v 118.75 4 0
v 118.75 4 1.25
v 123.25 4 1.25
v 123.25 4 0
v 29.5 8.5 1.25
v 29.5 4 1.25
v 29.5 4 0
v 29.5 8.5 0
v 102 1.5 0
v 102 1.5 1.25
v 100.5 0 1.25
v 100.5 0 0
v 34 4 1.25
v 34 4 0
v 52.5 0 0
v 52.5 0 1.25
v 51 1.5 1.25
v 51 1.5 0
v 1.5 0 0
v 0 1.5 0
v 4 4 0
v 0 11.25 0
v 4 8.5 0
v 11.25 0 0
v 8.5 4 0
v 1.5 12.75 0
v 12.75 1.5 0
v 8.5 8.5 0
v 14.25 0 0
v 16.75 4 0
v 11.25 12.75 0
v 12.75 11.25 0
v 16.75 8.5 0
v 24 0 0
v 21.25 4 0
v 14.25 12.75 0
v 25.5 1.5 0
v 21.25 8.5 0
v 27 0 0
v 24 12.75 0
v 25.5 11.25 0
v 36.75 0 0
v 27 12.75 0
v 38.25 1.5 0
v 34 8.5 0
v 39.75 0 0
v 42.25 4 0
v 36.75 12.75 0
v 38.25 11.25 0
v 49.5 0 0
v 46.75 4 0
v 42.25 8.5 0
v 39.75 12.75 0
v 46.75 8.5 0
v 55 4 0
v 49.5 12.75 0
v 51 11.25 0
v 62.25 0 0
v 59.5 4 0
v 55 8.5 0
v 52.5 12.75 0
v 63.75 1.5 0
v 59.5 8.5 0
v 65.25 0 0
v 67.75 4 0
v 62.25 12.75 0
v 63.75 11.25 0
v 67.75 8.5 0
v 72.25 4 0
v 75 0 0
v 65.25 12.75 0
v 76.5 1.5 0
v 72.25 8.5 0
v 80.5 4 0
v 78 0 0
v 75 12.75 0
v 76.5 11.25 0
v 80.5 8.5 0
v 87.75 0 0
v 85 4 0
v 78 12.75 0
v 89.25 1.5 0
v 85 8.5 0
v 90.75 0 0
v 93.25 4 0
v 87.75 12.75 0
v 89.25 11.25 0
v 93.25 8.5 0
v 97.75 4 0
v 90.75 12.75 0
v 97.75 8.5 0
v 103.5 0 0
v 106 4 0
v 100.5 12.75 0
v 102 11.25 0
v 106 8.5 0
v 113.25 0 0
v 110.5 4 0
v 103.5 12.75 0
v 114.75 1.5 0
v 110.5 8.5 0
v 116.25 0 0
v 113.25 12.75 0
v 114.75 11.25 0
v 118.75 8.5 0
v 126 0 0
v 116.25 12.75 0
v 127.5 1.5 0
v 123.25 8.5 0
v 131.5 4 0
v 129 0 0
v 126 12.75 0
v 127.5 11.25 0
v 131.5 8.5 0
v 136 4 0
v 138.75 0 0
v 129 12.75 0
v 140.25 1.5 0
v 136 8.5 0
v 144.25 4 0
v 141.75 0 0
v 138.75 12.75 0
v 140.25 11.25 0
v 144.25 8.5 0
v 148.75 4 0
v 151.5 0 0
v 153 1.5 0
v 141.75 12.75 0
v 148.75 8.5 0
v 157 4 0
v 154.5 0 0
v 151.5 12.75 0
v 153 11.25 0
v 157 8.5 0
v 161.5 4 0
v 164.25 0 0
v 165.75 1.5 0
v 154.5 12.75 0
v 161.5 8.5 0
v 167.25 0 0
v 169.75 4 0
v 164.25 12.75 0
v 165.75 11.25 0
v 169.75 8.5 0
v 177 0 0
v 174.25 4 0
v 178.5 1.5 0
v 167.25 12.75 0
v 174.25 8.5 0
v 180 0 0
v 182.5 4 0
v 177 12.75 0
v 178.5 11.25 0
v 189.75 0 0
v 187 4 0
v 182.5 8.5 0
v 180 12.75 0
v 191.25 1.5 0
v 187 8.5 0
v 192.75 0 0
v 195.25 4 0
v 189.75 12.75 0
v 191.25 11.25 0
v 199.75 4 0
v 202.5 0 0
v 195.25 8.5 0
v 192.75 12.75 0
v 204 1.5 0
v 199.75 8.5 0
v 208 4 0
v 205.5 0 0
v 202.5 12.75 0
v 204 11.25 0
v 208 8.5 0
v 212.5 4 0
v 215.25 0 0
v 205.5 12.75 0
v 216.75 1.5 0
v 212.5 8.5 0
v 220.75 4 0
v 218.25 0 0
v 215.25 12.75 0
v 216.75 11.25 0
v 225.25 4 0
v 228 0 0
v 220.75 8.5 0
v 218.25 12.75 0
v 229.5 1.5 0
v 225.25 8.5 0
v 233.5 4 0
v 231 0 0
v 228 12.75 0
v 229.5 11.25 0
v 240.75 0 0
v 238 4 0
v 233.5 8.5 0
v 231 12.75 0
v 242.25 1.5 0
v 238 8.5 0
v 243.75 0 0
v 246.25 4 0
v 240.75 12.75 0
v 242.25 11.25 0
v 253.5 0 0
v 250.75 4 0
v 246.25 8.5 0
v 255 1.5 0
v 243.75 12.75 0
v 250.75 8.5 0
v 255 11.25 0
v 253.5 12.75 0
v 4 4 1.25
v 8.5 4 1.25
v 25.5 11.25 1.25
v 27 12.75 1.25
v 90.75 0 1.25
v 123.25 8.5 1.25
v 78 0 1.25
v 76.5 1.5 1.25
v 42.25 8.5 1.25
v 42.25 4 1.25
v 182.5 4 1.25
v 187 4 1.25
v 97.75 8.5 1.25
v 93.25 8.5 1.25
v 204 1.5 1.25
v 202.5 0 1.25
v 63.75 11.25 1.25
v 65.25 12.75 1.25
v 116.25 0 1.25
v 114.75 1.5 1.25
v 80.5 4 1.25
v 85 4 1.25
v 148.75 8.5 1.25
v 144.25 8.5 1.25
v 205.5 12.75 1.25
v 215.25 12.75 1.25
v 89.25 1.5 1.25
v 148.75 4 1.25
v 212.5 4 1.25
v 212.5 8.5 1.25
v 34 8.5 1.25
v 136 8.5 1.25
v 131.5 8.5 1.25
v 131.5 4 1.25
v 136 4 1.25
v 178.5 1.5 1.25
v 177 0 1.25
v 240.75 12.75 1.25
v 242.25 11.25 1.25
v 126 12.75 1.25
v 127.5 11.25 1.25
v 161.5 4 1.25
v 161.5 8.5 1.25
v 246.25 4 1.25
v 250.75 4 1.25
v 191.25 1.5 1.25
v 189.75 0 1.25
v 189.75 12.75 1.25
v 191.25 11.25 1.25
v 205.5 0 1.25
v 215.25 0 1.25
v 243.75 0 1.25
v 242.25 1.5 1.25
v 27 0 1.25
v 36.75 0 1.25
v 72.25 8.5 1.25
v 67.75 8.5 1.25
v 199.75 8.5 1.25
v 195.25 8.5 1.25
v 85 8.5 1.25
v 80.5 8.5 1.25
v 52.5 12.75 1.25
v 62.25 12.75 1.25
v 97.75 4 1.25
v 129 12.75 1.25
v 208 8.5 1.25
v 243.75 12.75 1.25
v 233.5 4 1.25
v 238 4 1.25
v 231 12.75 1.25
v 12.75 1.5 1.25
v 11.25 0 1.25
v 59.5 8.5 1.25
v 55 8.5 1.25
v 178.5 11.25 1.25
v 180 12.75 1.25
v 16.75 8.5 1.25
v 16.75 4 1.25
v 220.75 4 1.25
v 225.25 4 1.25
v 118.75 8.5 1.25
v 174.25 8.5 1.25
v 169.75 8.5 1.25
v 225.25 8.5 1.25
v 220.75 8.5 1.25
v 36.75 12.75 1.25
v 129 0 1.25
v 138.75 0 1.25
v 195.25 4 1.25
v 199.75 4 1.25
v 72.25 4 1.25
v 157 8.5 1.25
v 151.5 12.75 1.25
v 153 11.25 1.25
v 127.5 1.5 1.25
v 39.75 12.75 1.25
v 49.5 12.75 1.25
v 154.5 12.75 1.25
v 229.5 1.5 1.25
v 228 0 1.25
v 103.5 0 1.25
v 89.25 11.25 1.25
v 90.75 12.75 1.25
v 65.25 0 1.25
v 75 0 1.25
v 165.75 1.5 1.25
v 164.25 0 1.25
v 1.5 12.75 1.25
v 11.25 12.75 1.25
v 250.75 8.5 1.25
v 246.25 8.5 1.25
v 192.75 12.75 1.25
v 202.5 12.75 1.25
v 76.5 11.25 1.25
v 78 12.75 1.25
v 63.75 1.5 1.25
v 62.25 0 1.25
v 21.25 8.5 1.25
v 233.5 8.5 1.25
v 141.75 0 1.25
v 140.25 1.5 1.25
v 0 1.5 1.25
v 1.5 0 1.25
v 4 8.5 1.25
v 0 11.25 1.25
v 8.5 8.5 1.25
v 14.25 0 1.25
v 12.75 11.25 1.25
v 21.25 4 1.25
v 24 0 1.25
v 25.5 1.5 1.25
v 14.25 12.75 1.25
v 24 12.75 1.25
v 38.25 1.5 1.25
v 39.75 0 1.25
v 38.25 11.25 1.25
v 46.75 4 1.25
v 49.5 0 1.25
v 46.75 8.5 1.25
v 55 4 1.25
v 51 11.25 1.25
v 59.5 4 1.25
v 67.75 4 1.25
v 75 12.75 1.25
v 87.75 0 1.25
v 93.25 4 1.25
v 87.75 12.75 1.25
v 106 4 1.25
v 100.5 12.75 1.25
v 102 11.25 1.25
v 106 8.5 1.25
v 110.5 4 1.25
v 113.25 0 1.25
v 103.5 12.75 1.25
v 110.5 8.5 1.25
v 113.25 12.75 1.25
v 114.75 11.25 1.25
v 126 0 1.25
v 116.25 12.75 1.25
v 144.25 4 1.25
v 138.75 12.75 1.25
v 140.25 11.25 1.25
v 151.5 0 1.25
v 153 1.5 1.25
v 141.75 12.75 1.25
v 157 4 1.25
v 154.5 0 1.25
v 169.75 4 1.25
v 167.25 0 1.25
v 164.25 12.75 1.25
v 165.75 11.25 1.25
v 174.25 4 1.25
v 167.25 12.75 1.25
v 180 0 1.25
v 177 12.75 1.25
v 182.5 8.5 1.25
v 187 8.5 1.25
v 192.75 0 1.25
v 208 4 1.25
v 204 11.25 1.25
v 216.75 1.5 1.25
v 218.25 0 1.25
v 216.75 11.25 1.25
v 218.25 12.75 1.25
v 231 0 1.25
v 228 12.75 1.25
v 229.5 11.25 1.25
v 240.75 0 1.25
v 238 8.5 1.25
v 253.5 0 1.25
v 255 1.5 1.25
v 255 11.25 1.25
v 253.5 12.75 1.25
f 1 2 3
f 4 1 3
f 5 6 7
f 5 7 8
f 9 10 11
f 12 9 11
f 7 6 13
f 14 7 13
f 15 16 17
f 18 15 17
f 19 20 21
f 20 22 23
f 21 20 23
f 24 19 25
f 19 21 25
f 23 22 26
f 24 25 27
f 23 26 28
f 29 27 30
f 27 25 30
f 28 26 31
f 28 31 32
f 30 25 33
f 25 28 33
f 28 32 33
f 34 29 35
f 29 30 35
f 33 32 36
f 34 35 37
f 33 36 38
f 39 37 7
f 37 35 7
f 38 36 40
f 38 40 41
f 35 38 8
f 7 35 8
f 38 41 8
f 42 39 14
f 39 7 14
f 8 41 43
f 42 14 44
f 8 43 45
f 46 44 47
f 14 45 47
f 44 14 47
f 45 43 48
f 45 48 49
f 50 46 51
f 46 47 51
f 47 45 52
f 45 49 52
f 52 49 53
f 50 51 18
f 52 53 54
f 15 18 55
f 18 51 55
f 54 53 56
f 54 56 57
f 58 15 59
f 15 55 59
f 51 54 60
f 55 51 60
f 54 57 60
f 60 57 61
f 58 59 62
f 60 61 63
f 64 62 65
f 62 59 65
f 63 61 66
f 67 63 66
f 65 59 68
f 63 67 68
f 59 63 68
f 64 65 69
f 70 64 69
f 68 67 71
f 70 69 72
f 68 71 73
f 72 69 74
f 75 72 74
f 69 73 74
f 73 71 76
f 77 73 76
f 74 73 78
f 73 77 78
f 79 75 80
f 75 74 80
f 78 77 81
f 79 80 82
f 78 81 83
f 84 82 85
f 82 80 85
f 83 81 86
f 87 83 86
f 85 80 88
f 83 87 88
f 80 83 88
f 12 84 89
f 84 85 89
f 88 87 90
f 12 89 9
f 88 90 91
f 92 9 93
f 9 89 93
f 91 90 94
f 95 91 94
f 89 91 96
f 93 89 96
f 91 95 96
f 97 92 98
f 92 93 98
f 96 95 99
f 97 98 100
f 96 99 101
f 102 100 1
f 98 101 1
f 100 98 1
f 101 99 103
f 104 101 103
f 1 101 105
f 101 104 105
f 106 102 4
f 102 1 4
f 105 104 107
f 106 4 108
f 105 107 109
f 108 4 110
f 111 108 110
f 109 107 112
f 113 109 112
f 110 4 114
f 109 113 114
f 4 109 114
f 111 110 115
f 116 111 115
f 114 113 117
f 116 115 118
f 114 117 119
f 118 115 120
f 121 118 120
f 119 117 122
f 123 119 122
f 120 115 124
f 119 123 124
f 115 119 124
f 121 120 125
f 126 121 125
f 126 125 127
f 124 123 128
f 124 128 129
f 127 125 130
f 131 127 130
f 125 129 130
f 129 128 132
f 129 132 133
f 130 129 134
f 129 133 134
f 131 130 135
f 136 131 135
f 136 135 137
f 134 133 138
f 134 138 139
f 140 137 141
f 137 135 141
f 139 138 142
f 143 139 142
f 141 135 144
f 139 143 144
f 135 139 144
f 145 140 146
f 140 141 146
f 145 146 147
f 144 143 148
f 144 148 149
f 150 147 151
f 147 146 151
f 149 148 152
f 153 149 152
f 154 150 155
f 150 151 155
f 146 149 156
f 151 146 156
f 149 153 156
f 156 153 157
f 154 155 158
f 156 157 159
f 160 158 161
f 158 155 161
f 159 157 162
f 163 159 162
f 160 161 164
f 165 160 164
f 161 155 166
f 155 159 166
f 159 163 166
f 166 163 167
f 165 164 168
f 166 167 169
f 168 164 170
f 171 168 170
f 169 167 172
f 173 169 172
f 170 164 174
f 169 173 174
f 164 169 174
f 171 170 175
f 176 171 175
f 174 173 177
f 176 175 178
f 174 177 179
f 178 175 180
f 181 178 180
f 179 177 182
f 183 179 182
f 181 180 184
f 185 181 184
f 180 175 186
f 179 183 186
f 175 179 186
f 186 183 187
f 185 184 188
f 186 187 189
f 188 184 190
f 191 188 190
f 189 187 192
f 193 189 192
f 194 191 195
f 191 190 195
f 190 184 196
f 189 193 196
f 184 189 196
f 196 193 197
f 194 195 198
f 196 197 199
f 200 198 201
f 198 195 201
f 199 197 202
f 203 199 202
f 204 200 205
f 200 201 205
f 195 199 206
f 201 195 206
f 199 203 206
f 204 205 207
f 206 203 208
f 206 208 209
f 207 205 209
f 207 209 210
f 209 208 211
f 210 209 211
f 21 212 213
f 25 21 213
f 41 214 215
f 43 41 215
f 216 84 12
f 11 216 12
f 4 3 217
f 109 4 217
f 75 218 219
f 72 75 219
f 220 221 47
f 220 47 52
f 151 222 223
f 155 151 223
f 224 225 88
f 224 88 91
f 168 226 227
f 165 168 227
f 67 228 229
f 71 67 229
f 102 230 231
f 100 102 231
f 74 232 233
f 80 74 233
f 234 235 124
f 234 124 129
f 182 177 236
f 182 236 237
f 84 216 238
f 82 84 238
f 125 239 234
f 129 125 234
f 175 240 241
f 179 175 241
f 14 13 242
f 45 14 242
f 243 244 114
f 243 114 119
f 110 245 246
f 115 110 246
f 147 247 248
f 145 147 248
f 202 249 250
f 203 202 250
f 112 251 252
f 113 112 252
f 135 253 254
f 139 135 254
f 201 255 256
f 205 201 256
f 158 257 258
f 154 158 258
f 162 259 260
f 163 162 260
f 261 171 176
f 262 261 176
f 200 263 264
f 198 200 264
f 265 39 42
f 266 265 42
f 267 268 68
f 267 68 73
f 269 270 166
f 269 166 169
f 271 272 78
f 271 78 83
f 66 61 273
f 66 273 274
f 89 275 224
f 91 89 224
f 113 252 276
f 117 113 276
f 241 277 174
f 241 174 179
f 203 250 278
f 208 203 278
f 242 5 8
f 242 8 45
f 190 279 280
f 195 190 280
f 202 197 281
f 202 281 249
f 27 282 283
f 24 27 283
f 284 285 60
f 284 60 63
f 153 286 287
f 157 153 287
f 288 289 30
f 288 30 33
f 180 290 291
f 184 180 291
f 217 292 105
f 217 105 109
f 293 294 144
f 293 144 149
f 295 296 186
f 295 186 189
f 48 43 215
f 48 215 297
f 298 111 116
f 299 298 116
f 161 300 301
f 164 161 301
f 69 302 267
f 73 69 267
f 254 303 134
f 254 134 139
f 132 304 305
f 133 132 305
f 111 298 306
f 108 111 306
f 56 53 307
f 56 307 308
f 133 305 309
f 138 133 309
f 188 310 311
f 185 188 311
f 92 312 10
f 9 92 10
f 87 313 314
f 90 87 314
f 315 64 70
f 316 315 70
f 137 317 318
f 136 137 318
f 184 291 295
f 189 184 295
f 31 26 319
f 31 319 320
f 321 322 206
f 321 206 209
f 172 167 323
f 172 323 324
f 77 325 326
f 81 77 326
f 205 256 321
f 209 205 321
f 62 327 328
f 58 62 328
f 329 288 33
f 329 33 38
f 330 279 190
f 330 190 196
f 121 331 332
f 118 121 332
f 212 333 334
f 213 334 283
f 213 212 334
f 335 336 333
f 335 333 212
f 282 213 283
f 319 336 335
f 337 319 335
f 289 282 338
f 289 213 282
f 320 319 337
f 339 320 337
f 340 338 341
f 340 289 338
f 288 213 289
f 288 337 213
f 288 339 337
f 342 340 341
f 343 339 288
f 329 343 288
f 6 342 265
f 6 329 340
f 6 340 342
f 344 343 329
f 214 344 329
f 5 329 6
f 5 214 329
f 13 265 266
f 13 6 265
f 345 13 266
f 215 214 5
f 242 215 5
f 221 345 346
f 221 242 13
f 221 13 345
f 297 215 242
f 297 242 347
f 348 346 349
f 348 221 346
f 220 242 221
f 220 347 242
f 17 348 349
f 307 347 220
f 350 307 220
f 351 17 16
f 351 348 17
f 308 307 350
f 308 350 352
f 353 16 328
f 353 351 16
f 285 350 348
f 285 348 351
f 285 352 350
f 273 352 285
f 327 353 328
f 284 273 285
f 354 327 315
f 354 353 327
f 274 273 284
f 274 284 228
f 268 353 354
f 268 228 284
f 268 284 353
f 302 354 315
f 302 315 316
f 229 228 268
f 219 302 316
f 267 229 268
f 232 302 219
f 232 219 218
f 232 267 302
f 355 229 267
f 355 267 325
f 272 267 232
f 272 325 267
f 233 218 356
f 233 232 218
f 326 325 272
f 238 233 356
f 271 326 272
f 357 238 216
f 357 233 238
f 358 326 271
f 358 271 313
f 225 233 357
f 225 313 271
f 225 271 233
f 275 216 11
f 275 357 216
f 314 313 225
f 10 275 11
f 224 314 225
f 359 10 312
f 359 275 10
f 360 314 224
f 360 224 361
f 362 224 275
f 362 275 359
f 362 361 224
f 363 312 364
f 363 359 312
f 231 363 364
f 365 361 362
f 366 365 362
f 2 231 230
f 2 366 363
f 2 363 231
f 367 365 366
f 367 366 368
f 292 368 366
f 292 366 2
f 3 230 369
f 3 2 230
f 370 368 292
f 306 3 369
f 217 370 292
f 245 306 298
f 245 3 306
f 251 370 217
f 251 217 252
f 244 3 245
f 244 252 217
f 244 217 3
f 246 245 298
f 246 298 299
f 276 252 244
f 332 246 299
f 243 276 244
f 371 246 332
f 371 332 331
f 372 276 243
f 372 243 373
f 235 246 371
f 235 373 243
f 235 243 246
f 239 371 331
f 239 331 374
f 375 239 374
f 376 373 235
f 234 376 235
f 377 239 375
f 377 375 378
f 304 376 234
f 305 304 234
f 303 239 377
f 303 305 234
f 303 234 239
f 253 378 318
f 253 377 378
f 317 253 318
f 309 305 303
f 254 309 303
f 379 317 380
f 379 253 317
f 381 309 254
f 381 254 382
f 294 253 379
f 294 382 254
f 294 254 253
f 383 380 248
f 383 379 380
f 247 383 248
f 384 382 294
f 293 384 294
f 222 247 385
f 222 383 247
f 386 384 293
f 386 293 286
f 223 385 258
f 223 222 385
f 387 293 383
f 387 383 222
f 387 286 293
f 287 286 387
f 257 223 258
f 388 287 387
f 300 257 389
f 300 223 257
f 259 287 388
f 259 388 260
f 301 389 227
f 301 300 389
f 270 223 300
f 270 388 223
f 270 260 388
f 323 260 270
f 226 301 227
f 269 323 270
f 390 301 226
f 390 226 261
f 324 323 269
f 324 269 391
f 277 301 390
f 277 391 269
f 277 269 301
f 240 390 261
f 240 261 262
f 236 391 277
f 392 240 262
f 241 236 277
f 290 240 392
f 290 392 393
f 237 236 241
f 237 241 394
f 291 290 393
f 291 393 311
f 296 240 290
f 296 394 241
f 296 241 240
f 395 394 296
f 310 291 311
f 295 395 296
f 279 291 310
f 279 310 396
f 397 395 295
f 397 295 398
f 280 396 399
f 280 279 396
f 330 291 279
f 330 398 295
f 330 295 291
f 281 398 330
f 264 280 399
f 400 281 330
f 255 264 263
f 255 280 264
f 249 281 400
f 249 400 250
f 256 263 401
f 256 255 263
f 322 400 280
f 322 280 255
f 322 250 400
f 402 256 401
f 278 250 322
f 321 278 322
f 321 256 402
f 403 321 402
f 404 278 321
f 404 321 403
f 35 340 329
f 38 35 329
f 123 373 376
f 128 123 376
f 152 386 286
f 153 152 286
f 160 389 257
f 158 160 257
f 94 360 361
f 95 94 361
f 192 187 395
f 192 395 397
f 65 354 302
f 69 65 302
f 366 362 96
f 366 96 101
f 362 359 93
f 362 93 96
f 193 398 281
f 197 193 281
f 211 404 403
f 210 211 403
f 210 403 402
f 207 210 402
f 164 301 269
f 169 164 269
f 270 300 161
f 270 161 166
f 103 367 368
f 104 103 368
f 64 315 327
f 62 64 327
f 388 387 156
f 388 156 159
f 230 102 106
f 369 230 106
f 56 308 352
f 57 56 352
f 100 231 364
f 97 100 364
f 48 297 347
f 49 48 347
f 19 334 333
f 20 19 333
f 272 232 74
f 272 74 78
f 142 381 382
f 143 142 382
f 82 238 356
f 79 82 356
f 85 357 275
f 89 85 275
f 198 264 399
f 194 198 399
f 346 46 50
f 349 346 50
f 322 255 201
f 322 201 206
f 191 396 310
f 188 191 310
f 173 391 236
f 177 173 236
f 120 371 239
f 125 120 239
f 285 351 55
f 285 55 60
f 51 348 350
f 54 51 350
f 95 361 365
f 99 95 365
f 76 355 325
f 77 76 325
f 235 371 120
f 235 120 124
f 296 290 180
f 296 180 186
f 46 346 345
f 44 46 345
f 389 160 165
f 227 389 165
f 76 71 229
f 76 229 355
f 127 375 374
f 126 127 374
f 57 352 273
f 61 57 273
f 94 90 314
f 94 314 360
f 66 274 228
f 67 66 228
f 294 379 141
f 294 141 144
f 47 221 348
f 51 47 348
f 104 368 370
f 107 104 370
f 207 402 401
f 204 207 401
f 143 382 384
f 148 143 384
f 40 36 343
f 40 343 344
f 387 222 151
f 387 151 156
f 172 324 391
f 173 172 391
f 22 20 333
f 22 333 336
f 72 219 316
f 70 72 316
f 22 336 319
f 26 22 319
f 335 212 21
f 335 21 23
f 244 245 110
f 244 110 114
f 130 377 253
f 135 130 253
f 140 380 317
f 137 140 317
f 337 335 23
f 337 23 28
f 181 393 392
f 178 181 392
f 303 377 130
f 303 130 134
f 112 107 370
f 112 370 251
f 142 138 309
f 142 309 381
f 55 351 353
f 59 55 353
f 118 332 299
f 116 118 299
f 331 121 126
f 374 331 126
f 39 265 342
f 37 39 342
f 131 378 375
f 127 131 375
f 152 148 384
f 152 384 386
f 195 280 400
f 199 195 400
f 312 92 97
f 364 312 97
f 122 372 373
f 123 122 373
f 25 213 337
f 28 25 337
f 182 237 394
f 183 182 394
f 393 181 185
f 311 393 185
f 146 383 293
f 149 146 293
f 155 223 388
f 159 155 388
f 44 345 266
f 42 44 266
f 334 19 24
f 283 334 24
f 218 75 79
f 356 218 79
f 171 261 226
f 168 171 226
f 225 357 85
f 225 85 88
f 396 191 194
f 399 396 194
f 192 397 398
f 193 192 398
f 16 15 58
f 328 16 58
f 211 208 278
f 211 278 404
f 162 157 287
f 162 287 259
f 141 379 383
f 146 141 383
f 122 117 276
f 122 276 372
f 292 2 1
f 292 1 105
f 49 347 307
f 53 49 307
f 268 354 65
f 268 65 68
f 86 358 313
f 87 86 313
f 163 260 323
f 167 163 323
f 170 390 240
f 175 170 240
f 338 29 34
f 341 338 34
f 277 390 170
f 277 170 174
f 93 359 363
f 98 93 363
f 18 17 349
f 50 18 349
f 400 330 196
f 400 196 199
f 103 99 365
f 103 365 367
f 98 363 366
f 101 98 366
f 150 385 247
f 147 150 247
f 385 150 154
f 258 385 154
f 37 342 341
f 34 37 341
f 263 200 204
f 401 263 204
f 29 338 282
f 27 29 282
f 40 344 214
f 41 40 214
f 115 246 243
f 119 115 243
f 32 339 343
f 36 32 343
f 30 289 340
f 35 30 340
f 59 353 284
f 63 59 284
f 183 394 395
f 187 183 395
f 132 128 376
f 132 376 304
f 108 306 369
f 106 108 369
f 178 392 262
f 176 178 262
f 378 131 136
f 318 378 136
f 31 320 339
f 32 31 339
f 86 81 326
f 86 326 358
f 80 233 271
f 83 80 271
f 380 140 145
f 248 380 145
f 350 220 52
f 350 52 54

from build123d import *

# Parameters (mm, degrees)
SKETCH1_W           = 319
SKETCH1_H           = 12.75
BOSS_EXTRUDE1_DEPTH = 1.25
SKETCH2_W           = 4.5
SKETCH2_H           = 4.5
CUT_EXTRUDE1_DEPTH  = 18.25
SKETCH3_W           = 4.5
SKETCH3_H           = 4.5
CUT_EXTRUDE2_DEPTH  = 18.25
CUT_EXTRUDE3_DEPTH  = 18.25


with BuildPart() as part:
    # Sketch1 → Boss-Extrude1 (new body)
    with BuildSketch(Plane.XY):
        with Locations((159.5, 6.375)):
            Rectangle(SKETCH1_W, SKETCH1_H)
    extrude(amount=BOSS_EXTRUDE1_DEPTH)

    # Sketch2 → Cut-Extrude1 (cut)
    with BuildSketch(Plane.XY.offset(1.25)):
        with Locations((6.25, 6.25)):
            Rectangle(SKETCH2_W, SKETCH2_H)
        with Locations((19, 6.25)):
            Rectangle(SKETCH2_W, SKETCH2_H)
        with Locations((31.75, 6.25)):
            Rectangle(SKETCH2_W, SKETCH2_H)
        with Locations((44.5, 6.25)):
            Rectangle(SKETCH2_W, SKETCH2_H)
        with Locations((57.25, 6.25)):
            Rectangle(SKETCH2_W, SKETCH2_H)
        with Locations((70, 6.25)):
            Rectangle(SKETCH2_W, SKETCH2_H)
        with Locations((82.75, 6.25)):
            Rectangle(SKETCH2_W, SKETCH2_H)
        with Locations((95.5, 6.25)):
            Rectangle(SKETCH2_W, SKETCH2_H)
        with Locations((108.25, 6.25)):
            Rectangle(SKETCH2_W, SKETCH2_H)
        with Locations((133.75, 6.25)):
            Rectangle(SKETCH2_W, SKETCH2_H)
        with Locations((146.5, 6.25)):
            Rectangle(SKETCH2_W, SKETCH2_H)
        with Locations((172, 6.25)):
            Rectangle(SKETCH2_W, SKETCH2_H)
        with Locations((184.75, 6.25)):
            Rectangle(SKETCH2_W, SKETCH2_H)
        with Locations((210.25, 6.25)):
            Rectangle(SKETCH2_W, SKETCH2_H)
        with Locations((223, 6.25)):
            Rectangle(SKETCH2_W, SKETCH2_H)
        with Locations((235.75, 6.25)):
            Rectangle(SKETCH2_W, SKETCH2_H)
        with Locations((248.5, 6.25)):
            Rectangle(SKETCH2_W, SKETCH2_H)
        with Locations((261.25, 6.25)):
            Rectangle(SKETCH2_W, SKETCH2_H)
        with Locations((274, 6.25)):
            Rectangle(SKETCH2_W, SKETCH2_H)
        with Locations((286.75, 6.25)):
            Rectangle(SKETCH2_W, SKETCH2_H)
        with Locations((299.5, 6.25)):
            Rectangle(SKETCH2_W, SKETCH2_H)
        with Locations((312.25, 6.25)):
            Rectangle(SKETCH2_W, SKETCH2_H)
        Polygon((0, 12.75), (0, 11.25), (1.5, 12.75), align=None)
        Polygon((1.5, 0), (0, 1.5), (0, 0), align=None)
        Polygon((14.25, 12.75), (11.25, 12.75), (12.75, 11.25), align=None)
        Polygon((12.75, 1.5), (11.25, 0), (14.25, 0), align=None)
        Polygon((25.5, 1.5), (24, 0), (27, 0), align=None)
        Polygon((27, 12.75), (24, 12.75), (25.5, 11.25), align=None)
        Polygon((38.25, 1.5), (36.75, 0), (39.75, 0), align=None)
        Polygon((52.5, 12.75), (49.5, 12.75), (51, 11.25), align=None)
        Polygon((51, 1.5), (49.5, 0), (52.5, 0), align=None)
        Polygon((39.75, 12.75), (36.75, 12.75), (38.25, 11.25), align=None)
        Polygon((65.25, 12.75), (62.25, 12.75), (63.75, 11.25), align=None)
        Polygon((63.75, 1.5), (62.25, 0), (65.25, 0), align=None)
        Polygon((76.5, 1.5), (75, 0), (78, 0), align=None)
        Polygon((78, 12.75), (75, 12.75), (76.5, 11.25), align=None)
        Polygon((90.75, 12.75), (87.75, 12.75), (89.25, 11.25), align=None)
        Polygon((89.25, 1.5), (87.75, 0), (90.75, 0), align=None)
        Polygon((102, 1.5), (100.5, 0), (103.5, 0), align=None)
        Polygon((103.5, 12.75), (100.5, 12.75), (102, 11.25), align=None)
        Polygon((116.25, 12.75), (113.25, 12.75), (114.75, 11.25), align=None)
        Polygon((114.75, 1.5), (113.25, 0), (116.25, 0), align=None)
        Polygon((127.5, 1.5), (126, 0), (129, 0), align=None)
        Polygon((129, 12.75), (126, 12.75), (127.5, 11.25), align=None)
        Polygon((140.25, 1.5), (138.75, 0), (141.75, 0), align=None)
        Polygon((141.75, 12.75), (138.75, 12.75), (140.25, 11.25), align=None)
        Polygon((154.5, 12.75), (151.5, 12.75), (153, 11.25), align=None)
        Polygon((153, 1.5), (151.5, 0), (154.5, 0), align=None)
        Polygon((167.25, 12.75), (164.25, 12.75), (165.75, 11.25), align=None)
        Polygon((180, 12.75), (177, 12.75), (178.5, 11.25), align=None)
        Polygon((192.75, 12.75), (189.75, 12.75), (191.25, 11.25), align=None)
        Polygon((205.5, 12.75), (202.5, 12.75), (204, 11.25), align=None)
        Polygon((218.25, 12.75), (215.25, 12.75), (216.75, 11.25), align=None)
        Polygon((231, 12.75), (228, 12.75), (229.5, 11.25), align=None)
        Polygon((243.75, 12.75), (240.75, 12.75), (242.25, 11.25), align=None)
        Polygon((256.5, 12.75), (253.5, 12.75), (255, 11.25), align=None)
        Polygon((269.25, 12.75), (266.25, 12.75), (267.75, 11.25), align=None)
        Polygon((282, 12.75), (279, 12.75), (280.5, 11.25), align=None)
        Polygon((294.75, 12.75), (291.75, 12.75), (293.25, 11.25), align=None)
        Polygon((307.5, 12.75), (304.5, 12.75), (306, 11.25), align=None)
        Polygon((318.75, 1.5), (317.25, 0), (319, 0), (319, 12.75), (317.25, 12.75), (318.75, 11.25), align=None)
        Polygon((306, 1.5), (304.5, 0), (307.5, 0), align=None)
        Polygon((293.25, 1.5), (291.75, 0), (294.75, 0), align=None)
        Polygon((280.5, 1.5), (279, 0), (282, 0), align=None)
        Polygon((267.75, 1.5), (266.25, 0), (269.25, 0), align=None)
        Polygon((255, 1.5), (253.5, 0), (256.5, 0), align=None)
        Polygon((242.25, 1.5), (240.75, 0), (243.75, 0), align=None)
        Polygon((229.5, 1.5), (228, 0), (231, 0), align=None)
        Polygon((165.75, 1.5), (164.25, 0), (167.25, 0), align=None)
        Polygon((178.5, 1.5), (177, 0), (180, 0), align=None)
        Polygon((191.25, 1.5), (189.75, 0), (192.75, 0), align=None)
        Polygon((204, 1.5), (202.5, 0), (205.5, 0), align=None)
        Polygon((216.75, 1.5), (215.25, 0), (218.25, 0), align=None)
        with Locations((121, 6.25)):
            Rectangle(SKETCH2_W, SKETCH2_H)
        with Locations((197.5, 6.25)):
            Rectangle(SKETCH2_W, SKETCH2_H)
    extrude(amount=-CUT_EXTRUDE1_DEPTH, mode=Mode.SUBTRACT)

    # Sketch3 → Cut-Extrude2 (cut)
    with BuildSketch(Plane.XY.offset(1.25)):
        with Locations((159.25, 6.25)):
            Rectangle(SKETCH3_W, SKETCH3_H)
        with Locations((146.5, 6.25)):
            Rectangle(SKETCH3_W, SKETCH3_H)
    extrude(amount=-CUT_EXTRUDE2_DEPTH, mode=Mode.SUBTRACT)

    # Sketch4 → Cut-Extrude3 (cut)
    with BuildSketch(Plane.XY.offset(1.25)):
        Polygon((255, 14.329492595), (255, 11.25), (255, 1.5), (255, -2.349525885), (322.855665697, -2.349525885), (322.855665697, 14.329492595), align=None)
    extrude(amount=-CUT_EXTRUDE3_DEPTH, mode=Mode.SUBTRACT)


solid = part.part
